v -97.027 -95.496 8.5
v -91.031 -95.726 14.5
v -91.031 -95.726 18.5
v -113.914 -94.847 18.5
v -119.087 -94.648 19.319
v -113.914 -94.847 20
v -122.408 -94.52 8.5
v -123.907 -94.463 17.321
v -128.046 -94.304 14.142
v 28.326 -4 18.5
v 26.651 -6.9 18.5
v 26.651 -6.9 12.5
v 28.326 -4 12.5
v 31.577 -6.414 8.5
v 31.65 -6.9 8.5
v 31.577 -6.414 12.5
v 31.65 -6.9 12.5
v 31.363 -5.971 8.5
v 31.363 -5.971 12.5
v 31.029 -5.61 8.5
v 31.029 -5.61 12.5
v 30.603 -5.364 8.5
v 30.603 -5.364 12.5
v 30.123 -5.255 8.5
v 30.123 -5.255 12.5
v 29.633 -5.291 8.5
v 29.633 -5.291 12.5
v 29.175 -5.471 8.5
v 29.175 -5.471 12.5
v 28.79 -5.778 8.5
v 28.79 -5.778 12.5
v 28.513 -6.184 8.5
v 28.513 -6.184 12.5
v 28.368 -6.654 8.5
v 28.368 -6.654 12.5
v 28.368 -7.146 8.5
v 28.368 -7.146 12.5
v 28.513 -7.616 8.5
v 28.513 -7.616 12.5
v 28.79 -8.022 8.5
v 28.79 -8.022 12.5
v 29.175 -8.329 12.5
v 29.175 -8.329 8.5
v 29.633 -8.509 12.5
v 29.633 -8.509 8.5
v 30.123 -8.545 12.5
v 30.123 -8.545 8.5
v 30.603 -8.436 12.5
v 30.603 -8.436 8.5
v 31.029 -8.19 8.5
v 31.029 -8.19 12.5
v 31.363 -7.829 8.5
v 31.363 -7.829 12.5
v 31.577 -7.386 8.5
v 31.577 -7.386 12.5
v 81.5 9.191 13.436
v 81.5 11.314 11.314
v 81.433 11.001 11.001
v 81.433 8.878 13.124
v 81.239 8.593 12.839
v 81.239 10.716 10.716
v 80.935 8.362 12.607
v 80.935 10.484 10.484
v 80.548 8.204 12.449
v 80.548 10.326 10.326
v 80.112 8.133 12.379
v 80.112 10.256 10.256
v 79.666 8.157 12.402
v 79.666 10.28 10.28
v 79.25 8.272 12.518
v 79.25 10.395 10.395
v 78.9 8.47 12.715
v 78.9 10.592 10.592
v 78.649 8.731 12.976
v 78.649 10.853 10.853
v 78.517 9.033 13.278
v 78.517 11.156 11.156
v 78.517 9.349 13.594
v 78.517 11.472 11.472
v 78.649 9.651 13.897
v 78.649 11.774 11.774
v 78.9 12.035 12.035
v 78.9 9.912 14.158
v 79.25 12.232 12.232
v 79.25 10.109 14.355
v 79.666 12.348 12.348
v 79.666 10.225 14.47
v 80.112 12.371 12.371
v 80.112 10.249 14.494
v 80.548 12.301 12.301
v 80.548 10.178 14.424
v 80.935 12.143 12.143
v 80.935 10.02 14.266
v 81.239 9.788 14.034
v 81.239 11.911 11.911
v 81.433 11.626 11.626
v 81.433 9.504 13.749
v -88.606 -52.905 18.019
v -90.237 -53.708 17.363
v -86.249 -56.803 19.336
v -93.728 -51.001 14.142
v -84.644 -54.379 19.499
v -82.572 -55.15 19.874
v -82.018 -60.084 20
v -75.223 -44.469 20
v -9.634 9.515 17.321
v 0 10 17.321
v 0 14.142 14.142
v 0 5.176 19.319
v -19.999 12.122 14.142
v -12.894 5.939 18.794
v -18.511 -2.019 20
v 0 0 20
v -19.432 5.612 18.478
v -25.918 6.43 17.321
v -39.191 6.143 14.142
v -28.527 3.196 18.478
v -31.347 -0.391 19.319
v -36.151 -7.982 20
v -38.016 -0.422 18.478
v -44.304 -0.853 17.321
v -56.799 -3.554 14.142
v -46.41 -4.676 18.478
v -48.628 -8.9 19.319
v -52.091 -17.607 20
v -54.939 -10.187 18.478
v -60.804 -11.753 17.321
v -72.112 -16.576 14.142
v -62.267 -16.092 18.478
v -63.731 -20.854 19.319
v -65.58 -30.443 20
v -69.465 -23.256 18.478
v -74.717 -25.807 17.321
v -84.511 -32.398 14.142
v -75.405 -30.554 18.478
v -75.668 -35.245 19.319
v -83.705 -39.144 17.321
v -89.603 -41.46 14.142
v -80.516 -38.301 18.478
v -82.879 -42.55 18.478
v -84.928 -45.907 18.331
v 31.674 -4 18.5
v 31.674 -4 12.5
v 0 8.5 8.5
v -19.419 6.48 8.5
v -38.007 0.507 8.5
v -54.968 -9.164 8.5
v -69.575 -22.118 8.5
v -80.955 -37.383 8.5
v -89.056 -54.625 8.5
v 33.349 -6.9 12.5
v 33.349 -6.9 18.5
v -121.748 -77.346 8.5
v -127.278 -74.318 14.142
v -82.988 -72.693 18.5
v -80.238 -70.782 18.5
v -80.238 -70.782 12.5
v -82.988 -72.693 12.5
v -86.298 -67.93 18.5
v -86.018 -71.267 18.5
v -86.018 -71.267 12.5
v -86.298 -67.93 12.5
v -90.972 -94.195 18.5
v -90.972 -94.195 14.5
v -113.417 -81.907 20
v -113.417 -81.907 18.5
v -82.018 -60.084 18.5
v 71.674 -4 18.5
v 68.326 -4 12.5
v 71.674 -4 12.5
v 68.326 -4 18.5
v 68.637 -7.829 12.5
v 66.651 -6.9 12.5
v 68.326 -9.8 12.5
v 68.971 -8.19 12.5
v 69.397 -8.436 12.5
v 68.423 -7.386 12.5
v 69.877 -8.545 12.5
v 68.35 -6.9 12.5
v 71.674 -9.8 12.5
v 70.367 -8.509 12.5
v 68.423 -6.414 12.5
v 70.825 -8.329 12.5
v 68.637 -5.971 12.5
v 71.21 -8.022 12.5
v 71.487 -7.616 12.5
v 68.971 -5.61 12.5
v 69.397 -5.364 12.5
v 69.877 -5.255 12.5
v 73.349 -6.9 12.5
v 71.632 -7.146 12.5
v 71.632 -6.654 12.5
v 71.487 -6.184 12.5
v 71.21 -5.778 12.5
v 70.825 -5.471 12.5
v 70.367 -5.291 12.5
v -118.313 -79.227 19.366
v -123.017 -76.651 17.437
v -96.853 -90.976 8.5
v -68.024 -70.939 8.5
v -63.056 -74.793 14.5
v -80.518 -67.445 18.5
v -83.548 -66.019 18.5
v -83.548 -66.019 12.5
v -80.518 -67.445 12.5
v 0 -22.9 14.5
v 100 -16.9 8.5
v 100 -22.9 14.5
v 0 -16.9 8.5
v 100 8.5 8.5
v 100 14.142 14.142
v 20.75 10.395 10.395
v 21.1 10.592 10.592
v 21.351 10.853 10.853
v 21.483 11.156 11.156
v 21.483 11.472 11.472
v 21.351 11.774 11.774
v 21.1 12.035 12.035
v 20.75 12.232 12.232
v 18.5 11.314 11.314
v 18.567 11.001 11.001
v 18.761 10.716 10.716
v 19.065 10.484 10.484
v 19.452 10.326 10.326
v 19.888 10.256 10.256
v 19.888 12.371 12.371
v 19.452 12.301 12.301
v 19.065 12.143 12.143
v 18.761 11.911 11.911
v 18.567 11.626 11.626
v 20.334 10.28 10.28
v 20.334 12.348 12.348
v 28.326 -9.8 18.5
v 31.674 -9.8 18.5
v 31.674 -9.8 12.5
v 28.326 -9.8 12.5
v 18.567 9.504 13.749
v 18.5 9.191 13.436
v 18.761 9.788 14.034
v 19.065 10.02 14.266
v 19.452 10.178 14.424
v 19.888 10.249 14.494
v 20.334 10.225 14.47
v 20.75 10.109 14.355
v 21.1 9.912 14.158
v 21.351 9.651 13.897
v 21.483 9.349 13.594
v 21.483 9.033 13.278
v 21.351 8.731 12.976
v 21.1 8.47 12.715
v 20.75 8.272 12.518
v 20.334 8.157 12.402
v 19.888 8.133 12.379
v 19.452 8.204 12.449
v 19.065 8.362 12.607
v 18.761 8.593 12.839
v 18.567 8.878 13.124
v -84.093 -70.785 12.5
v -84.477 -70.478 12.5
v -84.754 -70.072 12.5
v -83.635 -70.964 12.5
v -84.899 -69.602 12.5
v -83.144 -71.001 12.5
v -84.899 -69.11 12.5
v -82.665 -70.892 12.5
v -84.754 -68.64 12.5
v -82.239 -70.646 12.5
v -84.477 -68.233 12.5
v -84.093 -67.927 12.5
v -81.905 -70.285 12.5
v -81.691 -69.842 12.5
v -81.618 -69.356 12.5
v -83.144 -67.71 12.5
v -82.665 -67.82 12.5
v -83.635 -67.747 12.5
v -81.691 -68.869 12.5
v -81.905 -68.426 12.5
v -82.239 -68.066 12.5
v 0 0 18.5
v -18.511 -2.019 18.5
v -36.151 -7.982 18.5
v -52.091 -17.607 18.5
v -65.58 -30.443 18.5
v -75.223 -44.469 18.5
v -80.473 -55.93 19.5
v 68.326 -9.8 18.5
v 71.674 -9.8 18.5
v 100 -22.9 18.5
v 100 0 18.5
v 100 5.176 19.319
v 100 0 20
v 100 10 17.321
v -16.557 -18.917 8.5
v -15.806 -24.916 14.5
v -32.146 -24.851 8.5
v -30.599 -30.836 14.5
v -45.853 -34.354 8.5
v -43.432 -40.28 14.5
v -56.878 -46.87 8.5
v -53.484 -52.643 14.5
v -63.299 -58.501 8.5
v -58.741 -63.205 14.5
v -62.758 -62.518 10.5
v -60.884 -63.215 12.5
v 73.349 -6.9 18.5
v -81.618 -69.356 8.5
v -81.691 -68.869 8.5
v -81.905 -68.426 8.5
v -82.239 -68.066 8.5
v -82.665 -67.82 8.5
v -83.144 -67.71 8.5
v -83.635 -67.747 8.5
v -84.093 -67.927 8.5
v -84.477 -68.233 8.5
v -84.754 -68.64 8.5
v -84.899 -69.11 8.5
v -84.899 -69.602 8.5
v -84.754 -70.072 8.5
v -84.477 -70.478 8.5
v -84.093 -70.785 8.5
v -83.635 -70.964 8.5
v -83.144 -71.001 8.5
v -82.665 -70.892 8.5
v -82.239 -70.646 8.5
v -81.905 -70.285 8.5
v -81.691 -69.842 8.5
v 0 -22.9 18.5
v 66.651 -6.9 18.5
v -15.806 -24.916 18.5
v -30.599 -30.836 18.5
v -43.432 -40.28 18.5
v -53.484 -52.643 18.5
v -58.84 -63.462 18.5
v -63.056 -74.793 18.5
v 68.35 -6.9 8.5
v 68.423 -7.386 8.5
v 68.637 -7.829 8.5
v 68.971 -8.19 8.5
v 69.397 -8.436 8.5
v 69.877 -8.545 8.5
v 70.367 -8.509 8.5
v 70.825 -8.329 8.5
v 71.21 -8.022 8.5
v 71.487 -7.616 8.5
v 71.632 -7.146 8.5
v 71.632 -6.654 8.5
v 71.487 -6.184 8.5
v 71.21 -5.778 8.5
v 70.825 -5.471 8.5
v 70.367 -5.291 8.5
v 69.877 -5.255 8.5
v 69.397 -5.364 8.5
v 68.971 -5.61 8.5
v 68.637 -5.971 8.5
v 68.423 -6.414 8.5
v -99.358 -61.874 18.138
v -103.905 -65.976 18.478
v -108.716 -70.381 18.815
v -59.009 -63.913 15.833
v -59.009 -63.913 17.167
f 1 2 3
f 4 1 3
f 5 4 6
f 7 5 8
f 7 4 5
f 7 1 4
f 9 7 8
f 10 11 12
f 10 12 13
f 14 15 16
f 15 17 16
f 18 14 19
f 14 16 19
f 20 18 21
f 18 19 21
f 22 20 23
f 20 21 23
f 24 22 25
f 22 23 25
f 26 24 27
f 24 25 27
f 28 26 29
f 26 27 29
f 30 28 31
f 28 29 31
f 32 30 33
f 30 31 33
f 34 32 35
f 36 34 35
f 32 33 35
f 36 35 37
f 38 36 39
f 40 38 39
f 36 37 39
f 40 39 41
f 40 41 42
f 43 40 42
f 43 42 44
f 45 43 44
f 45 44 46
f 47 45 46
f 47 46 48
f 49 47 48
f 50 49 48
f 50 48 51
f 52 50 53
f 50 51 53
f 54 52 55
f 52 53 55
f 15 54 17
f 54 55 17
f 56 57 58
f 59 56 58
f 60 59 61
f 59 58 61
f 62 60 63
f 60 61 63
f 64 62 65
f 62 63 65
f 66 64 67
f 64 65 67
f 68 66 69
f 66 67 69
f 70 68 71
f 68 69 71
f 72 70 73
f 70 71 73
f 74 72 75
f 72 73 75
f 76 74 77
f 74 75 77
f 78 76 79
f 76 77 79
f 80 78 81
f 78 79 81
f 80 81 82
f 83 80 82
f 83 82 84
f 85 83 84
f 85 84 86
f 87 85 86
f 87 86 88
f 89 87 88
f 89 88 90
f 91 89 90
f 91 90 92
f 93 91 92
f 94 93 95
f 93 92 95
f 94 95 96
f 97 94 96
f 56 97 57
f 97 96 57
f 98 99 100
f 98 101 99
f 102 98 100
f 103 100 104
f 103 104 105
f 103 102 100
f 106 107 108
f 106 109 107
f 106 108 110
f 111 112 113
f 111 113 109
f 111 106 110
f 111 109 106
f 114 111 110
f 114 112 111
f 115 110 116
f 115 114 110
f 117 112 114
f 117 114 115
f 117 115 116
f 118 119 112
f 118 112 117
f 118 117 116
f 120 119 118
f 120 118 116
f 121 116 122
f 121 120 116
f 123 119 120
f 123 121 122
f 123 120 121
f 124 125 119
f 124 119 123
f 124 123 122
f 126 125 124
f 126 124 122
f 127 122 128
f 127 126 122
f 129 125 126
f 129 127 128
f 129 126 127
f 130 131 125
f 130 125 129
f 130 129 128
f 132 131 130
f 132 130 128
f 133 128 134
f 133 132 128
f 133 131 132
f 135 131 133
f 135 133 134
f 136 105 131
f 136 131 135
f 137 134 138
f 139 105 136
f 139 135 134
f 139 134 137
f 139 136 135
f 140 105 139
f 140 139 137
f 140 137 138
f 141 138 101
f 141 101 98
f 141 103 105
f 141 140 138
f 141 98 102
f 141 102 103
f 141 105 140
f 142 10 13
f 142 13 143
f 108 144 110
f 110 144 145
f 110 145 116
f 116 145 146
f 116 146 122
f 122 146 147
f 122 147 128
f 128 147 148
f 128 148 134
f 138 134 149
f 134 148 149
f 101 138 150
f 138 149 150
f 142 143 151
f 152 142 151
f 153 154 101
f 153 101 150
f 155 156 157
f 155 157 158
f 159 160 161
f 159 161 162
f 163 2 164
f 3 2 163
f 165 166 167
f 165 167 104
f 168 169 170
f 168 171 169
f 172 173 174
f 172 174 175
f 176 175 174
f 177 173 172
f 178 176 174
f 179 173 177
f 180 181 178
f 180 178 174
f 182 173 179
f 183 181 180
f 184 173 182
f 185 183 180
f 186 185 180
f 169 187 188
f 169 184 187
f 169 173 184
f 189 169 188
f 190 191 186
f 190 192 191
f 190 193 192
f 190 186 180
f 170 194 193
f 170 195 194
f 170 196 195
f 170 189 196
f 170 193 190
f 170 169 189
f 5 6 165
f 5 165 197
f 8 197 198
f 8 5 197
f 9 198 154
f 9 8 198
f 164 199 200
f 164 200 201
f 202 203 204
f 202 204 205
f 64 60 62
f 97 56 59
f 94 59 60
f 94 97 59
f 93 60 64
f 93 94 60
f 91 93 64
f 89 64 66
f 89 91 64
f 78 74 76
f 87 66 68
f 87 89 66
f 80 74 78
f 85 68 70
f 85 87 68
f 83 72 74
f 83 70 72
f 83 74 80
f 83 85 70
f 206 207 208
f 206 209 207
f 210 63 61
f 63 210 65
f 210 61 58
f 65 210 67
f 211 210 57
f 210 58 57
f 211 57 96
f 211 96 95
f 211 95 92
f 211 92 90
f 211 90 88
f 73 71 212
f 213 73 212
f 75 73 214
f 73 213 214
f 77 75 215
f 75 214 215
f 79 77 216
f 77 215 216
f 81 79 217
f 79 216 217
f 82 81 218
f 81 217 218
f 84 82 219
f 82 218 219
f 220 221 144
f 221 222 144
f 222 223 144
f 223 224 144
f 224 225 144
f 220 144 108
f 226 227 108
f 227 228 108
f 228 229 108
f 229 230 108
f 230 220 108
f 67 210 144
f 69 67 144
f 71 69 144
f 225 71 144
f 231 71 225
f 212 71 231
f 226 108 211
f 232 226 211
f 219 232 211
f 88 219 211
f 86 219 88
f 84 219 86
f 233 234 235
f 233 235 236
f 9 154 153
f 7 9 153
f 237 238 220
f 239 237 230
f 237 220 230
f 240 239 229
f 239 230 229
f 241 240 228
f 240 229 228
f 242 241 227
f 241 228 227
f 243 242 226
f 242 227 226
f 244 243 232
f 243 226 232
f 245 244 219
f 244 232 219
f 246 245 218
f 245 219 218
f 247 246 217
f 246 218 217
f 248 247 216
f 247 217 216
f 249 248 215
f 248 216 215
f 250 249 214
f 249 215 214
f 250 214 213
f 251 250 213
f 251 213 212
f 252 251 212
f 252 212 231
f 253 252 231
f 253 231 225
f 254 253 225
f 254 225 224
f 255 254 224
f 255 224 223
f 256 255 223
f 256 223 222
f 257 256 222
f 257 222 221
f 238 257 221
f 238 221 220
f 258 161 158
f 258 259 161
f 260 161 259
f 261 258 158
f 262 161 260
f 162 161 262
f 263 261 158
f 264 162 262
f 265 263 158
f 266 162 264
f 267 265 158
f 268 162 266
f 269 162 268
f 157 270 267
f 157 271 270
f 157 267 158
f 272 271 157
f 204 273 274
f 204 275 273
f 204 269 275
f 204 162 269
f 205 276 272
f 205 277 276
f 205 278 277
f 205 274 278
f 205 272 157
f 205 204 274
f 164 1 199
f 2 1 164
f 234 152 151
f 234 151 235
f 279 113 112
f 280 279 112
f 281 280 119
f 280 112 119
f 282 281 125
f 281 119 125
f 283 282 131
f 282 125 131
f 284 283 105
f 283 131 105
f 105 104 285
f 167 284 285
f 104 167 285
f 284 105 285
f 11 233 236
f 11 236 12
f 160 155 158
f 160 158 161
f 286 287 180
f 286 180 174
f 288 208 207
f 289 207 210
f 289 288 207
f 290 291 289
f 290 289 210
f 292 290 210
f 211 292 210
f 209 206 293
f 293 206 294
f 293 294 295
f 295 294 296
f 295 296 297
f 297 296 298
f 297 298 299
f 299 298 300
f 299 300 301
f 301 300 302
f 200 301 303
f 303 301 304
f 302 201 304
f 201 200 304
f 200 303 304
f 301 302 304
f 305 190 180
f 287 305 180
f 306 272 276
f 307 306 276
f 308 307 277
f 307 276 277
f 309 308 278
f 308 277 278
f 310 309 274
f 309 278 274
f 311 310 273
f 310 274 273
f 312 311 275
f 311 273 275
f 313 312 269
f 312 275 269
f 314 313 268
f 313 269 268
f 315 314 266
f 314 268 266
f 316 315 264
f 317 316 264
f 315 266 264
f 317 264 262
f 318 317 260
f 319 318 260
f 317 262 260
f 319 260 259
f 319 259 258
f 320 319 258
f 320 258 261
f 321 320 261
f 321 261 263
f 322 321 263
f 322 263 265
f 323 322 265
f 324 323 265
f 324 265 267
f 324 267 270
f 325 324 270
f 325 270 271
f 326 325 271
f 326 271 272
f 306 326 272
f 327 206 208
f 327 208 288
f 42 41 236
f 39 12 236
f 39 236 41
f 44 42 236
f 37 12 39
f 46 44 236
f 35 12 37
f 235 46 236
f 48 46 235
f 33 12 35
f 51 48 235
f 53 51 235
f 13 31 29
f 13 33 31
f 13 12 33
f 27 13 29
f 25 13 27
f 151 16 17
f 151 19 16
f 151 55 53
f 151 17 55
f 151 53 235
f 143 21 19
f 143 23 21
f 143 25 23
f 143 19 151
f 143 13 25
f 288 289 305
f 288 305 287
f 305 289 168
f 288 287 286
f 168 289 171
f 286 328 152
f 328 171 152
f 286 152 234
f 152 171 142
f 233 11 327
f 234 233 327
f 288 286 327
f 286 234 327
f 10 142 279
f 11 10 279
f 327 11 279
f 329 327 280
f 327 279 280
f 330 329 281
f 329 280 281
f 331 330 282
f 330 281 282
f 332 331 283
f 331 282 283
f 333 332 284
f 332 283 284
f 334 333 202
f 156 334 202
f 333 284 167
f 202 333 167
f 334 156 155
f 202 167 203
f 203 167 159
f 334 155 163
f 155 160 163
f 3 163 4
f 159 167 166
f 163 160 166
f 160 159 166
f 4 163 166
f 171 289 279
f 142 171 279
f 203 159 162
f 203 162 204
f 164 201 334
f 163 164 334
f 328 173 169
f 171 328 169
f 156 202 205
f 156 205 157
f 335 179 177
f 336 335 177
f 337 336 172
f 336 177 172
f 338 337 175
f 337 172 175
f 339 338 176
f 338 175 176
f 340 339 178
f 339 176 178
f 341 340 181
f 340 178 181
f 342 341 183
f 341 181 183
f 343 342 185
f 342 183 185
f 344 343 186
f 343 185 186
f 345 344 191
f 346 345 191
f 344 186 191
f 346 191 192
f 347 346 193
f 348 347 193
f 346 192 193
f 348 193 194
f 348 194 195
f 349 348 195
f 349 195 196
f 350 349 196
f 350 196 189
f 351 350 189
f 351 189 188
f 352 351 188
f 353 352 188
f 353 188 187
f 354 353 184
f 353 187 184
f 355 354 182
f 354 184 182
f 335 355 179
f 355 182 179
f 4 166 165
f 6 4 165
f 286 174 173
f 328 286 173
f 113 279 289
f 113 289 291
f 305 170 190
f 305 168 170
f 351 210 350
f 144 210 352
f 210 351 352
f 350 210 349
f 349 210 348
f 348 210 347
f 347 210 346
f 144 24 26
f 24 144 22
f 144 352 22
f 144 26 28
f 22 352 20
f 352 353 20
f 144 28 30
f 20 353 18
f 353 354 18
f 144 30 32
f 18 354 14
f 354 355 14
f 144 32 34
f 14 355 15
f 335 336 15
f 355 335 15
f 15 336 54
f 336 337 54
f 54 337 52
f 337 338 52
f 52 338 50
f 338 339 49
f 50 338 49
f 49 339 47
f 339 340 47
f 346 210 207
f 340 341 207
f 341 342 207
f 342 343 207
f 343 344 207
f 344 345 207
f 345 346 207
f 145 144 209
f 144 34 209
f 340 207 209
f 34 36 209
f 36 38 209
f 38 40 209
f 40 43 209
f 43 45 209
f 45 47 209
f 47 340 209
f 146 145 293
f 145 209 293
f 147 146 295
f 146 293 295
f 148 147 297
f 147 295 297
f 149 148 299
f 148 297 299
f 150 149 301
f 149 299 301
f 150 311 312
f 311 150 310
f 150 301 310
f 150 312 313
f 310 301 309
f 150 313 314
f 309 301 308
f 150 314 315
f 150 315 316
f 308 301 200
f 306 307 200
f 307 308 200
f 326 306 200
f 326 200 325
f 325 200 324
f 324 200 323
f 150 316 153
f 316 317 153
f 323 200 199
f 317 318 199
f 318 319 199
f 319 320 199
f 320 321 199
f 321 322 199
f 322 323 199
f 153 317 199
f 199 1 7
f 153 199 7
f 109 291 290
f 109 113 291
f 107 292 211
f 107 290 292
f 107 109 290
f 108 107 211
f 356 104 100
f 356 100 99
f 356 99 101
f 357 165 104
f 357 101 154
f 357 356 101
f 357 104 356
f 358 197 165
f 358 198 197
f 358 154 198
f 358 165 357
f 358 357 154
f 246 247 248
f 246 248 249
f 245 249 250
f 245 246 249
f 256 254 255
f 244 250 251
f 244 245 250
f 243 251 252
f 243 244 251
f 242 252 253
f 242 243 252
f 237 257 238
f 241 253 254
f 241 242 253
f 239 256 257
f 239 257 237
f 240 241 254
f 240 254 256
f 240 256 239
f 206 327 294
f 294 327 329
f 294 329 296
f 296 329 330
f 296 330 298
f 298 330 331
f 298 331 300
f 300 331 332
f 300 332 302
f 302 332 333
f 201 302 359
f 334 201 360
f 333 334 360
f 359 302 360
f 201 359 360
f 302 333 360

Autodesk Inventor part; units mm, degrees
ref_plane "YZ Plane" through (0, 0, 0) normal (1, 0, 0) x (0, 1, 0)
sketch "Sketch1" plane through (0, 0, 0) normal (1, 0, 0) x (0, 1, 0)
  circle A0 centre (0, 0) radius 20
  line L0 (8.5, 8.5) -> (-16.9, 8.5)
  line L1 (8.5, 8.5) -> (8.5, -16.9)
  line L2 (0, 0) -> (0, 20)
  line L3 (0, 20) -> (-60.9241, 20)
  line L4 (-60.9241, 20) -> (-60.9241, 18.5)
  line L5 (-60.9241, 18.5) -> (0, 18.5)
  line L6 (0, 18.5) -> (0, 20)
  line L7 (0, 0) -> (14.1421, 14.1421)
  line L8 (0, 0) -> (20, 0)
  line L9 (-16.9, 8.5) -> (-16.9, 18.5)
  line L10 (-16.9, 8.5) -> (-22.9, 14.5)
  line L11 (-22.9, 14.5) -> (-22.9, 18.5)
  line L12 (12.3744, 12.3744) -> (12.1502, 13.2109)
  line L13 (11.3137, 13.435) -> (9.2071, 11.3284)
  line L14 (9.4313, 10.4919) -> (10.2678, 10.2678)
  line L15 (8.5, 8.5) -> (8.5, -16.9)
  line L16 (20, 0) -> (20, -60.9241)
  line L17 (20, -60.9241) -> (18.5, -60.9241)
  line L18 (18.5, -60.9241) -> (18.5, 0)
  line L19 (8.5, -16.9) -> (18.5, -16.9)
  line L20 (8.5, -16.9) -> (14.5, -22.9)
  line L21 (14.5, -22.9) -> (18.5, -22.9)
  arc A1 (9.2071, 11.3284) -> (9.4313, 10.4919) centre (9.5607, 10.9749) ccw
  arc A2 (12.1502, 13.2109) -> (11.3137, 13.435) centre (11.6673, 13.0815) ccw
  line L22 (10.4311, 10.4311) -> (9.483, 10.6851)
  arc A3 (9.3485, 11.187) -> (9.483, 10.6851) centre (9.5607, 10.9749) ccw
  line L23 (9.3485, 11.187) -> (11.4551, 13.2936)
  arc A4 (11.957, 13.1591) -> (11.4551, 13.2936) centre (11.6673, 13.0815) ccw
  line L24 (11.957, 13.1591) -> (12.2111, 12.2111)
  point P0 (0, 8.5)
  point P1 (-17.7041, 9.3041)
  point P2 (-16.9, 10.6953)
  dimension "d0" = 40
  dimension "d1" = 25.4
  dimension "d2" = 1.5
  dimension "d4" = 45
  dimension "d6" = 45
  dimension "d7" = 4
  dimension "d8" = 10
  dimension "d10" = 2.5
  dimension "d11" = 2.5
  dimension "d12" = 60
  dimension "d13" = 1.5
  dimension "d15" = 0.5
  dimension "d16" = 0.2
extrude "Extrusion1" add sketch "Sketch1" along normal blind 100 contours L7 L12 A2 L13 A1 L14 L0 L2 A0 | L7 L24 A4 L23 A3 L22 L14 A1 L13 A2 L12 | L5 L2 L0 L9 A0 | A0 L9 L5 | L7 L22 A3 L23 A4 L24 | L9 L10 A0 | A0 L10 L11 L5 L9
sketch "Sketch2" plane through (0, -22.9, 18.5) normal (0, 0, 1) x (1, 0, 0)
  line L0 (0, 22.9) -> (0, 0) projected
  line L1 (0, 0) -> (100, 0) projected
  line L2 (100, 22.9) -> (100, 0) projected
  line L3 (0, 22.9) -> (100, 22.9) projected
  line L4 (28.3257, 13.1) -> (26.6514, 16)
  line L5 (26.6514, 16) -> (28.3257, 18.9)
  line L6 (28.3257, 18.9) -> (31.6743, 18.9)
  line L7 (31.6743, 18.9) -> (33.3486, 16)
  line L8 (33.3486, 16) -> (31.6743, 13.1)
  line L9 (31.6743, 13.1) -> (28.3257, 13.1)
  line L10 (0, 6) -> (100, 6) projected
  circle A0 centre (30, 16) radius 1.65
  dimension "d20" = 10
  dimension "d21" = 5.8
  dimension "d22" = 30
  dimension "d25" = 3.3
extrude "Extrusion2" cut sketch "Sketch2" against normal blind 6 contours L4 L5 L6 L7 L8 L9 | A0
extrude "Extrusion3" cut sketch "Sketch2" against normal through all contours A0
sketch "Sketch3" plane through (0, -22.9, 18.5) normal (0, 0, 1) x (1, 0, 0)
  line L0 (0, 37.0421) -> (100, 37.0421) projected
  line L1 (0, 0) -> (100, 0) projected
  line L2 (0, 22.9) -> (0, 0) projected
  line L3 (0, 22.9) -> (0, 37.0421) projected
  line L4 (2.4384, 37.0421) -> (17.8575, 0)
  line L5 (0, 0) -> (100, 0) projected
  line L6 (2.4384, 37.0421) -> (0, 42.9) projected
  point P0 (0, 26.9698)
  dimension "d28" = 112.6
sketch "Sketch4" plane through (100, 14.1421, 14.1421) normal (0, 0.7071, -0.7071) x (-1, 0, 0)
  line L0 (100, 0) -> (0, 0) projected
  line L1 (0, -7.9792) -> (0, 0) projected
  line L2 (100, -7.9792) -> (0, -7.9792) projected
  circle A0 centre (80, -4) radius 1.5
  line L3 (100, -7.9792) -> (100, 0) projected
  line L4 (50, -7.9792) -> (50, 0)
  ellipse E0 centre (70, -18.8686) end of major axis (68.35, -18.8686) minor radius 1.1667 projected
  point P0 (100, -20)
  dimension "d34" = 3
  dimension "d35" = 4
  dimension "d46" = 20
extrude "Extrusion5" cut sketch "Sketch4" against normal blind 3 contours A0
ref_plane "Work Plane1" through (50, 0, 0) normal (-1, 0, 0) x (0, 0, 1)
mirror "Mirror1" about plane through (50, 0, 0) normal (-1, 0, 0) of "Extrusion5", "Extrusion2", "Extrusion3"
ref_plane "Work Plane2" through (0, 14.1421, 14.1421) normal (0, 0, 1) x (1, 0, 0)
sketch "Sketch9" plane through (0, 14.1421, 14.1421) normal (0, 0, 1) x (1, 0, 0)
  line L0 (0, 0) -> (100, 0) projected
  line L1 (0, 0) -> (-127.2781, -88.4606) construction
  line L2 (0, -14.1421) -> (0, 0) projected
  arc A0 (0, 0) -> (-93.7282, -65.1428) centre (0, -100) ccw
  line L3 (-127.2781, -88.4606) -> (-93.7282, -65.1428)
  line L4 (-127.2781, -88.4606) -> (-128.0459, -108.4459)
  dimension "d61" = 155
  dimension "d62" = 145.2
  dimension "d63" = 100
  dimension "d66" = 127
  dimension "d67" = 20
sketch "Sketch10" plane through (0, 0, 0) normal (-1, 0, 0) x (0, 0, 1)
  line L0 (14.5, -22.9) -> (8.5, -16.9) projected
  line L1 (18.5, -22.9) -> (14.5, -22.9) projected
  line L2 (18.5, 0) -> (18.5, -22.9) projected
  line L3 (20, 0) -> (18.5, 0) projected
  arc A0 (20, 0) -> (14.1421, 14.1421) centre (0, 0) ccw projected
  line L4 (8.5, 8.5) -> (14.1421, 14.1421) projected
  line L5 (8.5, -16.9) -> (8.5, 8.5) projected
sweep "Sweep2" add profiles "Sketch10" path "Sketch9" path curves A0 L3 L4
sketch "Sketch11" plane through (100, -22.9, 18.5) normal (0, 0, 1) x (1, 0, 0)
  line L0 (-33.3486, 16) -> (-31.6743, 18.9) projected
  line L1 (-31.6743, 18.9) -> (-28.3257, 18.9) projected
  line L2 (-28.3257, 18.9) -> (-26.6514, 16) projected
  line L3 (-26.6514, 16) -> (-28.3257, 13.1) projected
  line L4 (-28.3257, 13.1) -> (-31.6743, 13.1) projected
  line L5 (-31.6743, 13.1) -> (-33.3486, 16) projected
  line L6 (-68.3257, 18.9) -> (-66.6514, 16) projected
  line L7 (-66.6514, 16) -> (-68.3257, 13.1) projected
  line L8 (-68.3257, 13.1) -> (-71.6743, 13.1) projected
  line L9 (-71.6743, 13.1) -> (-73.3486, 16) projected
  line L10 (-73.3486, 16) -> (-71.6743, 18.9) projected
  line L11 (-71.6743, 18.9) -> (-68.3257, 18.9) projected
  line L12 (-100, 0) -> (0, 0) projected
  line L13 (-100, 22.9) -> (0, 22.9) projected
  arc A0 (-100, 22.9) -> (-180.473, -33.0302) centre (-100, -62.9579) ccw projected
  line L14 (-180.473, -33.0302) -> (-182.0179, -37.1841) projected
  line L15 (-182.0179, -37.1841) -> (-213.4171, -59.0072) projected
  line L16 (-213.4171, -59.0072) -> (-213.9142, -71.9466) projected
  line L17 (-190.9723, -71.2953) -> (-191.0311, -72.8257) projected
  line L18 (-163.0556, -51.8928) -> (-190.9723, -71.2953) projected
  line L19 (-159.0093, -41.0125) -> (-163.0556, -51.8928) projected
  arc A1 (-100, 0) -> (-159.0093, -41.0125) centre (-100, -62.9579) ccw projected
  circle A2 centre (-30, 16) radius 1.65 projected
  circle A3 centre (-70, 16) radius 1.65 projected
  line L20 (-100, 31.4) -> (0, 31.4) projected
  line L21 (-100, 6) -> (0, 6) projected
  arc A4 (-100, 6) -> (-164.633, -38.9211) centre (-100, -62.9579) ccw projected
  line L22 (-164.633, -38.9211) -> (-168.0239, -48.039) projected
  line L23 (-168.0239, -48.039) -> (-196.853, -68.0757) projected
  line L24 (-196.853, -68.0757) -> (-197.0266, -72.5954) projected
  line L25 (-221.7481, -54.446) -> (-222.4079, -71.6203) projected
  line L26 (-189.0563, -31.7246) -> (-221.7481, -54.446) projected
  line L27 (-188.4399, -30.0674) -> (-189.0563, -31.7246) projected
  arc A5 (-100, 31.4) -> (-188.4399, -30.0674) centre (-100, -62.9579) ccw projected
  line L28 (-207.0193, -72.2115) -> (-206.6542, -62.7097)
  line L29 (-206.6542, -62.7097) -> (-176.3043, -41.616)
  line L30 (-176.3043, -41.616) -> (-174.0058, -35.4354)
  arc A6 (-100, 16) -> (-174.0058, -35.4354) centre (-100, -62.9579) ccw
  line L31 (-100, 16) -> (0, 16)
  line L32 (-186.0175, -48.3668) -> (-186.2977, -45.0299)
  line L33 (-186.2977, -45.0299) -> (-183.548, -43.1188)
  line L34 (-183.548, -43.1188) -> (-180.5181, -44.5446)
  line L35 (-180.5181, -44.5446) -> (-180.2379, -47.8815)
  line L36 (-180.2379, -47.8815) -> (-182.9876, -49.7926)
  line L37 (-182.9876, -49.7926) -> (-186.0175, -48.3668)
  circle A7 centre (-183.2678, -46.4557) radius 1.65
  point P0 (-181.6127, -48.8371)
  point P1 (-191.4793, -52.1629)
  dimension "d68" = 10
  dimension "d70" = 5.8
  dimension "d75" = 3.3
  dimension "d76" = 10
extrude "Extrusion7" cut sketch "Sketch11" against normal through all contours A7 L29 | L29 A7
extrude "Extrusion8" cut sketch "Sketch11" against normal blind 6 contours L35 L36 L37 L29 A7 | L29 A7 L32 L33 L34 | A7 L29 | L29 A7
sketch "Sketch12" plane through (100, -22.9, 18.5) normal (0, 0, 1) x (1, 0, 0)
  line L0 (-186.0175, -48.3668) -> (-186.2977, -45.0299) projected
  line L1 (-186.2977, -45.0299) -> (-183.548, -43.1188) projected
  line L2 (-183.548, -43.1188) -> (-180.5181, -44.5446) projected
  line L3 (-180.5181, -44.5446) -> (-180.2379, -47.8815) projected
  line L4 (-180.2379, -47.8815) -> (-182.9876, -49.7926) projected
  line L5 (-182.9876, -49.7926) -> (-186.0175, -48.3668) projected
  line L6 (-33.3486, 16) -> (-31.6743, 18.9) projected
  line L7 (-31.6743, 18.9) -> (-28.3257, 18.9) projected
  line L8 (-28.3257, 18.9) -> (-26.6514, 16) projected
  line L9 (-26.6514, 16) -> (-28.3257, 13.1) projected
  line L10 (-28.3257, 13.1) -> (-31.6743, 13.1) projected
  line L11 (-31.6743, 13.1) -> (-33.3486, 16) projected
  line L12 (-68.3257, 18.9) -> (-66.6514, 16) projected
  line L13 (-66.6514, 16) -> (-68.3257, 13.1) projected
  line L14 (-68.3257, 13.1) -> (-71.6743, 13.1) projected
  line L15 (-71.6743, 13.1) -> (-73.3486, 16) projected
  line L16 (-73.3486, 16) -> (-71.6743, 18.9) projected
  line L17 (-71.6743, 18.9) -> (-68.3257, 18.9) projected
  line L18 (-100, 0) -> (0, 0) projected
  line L19 (0, 22.9) -> (0, 0) projected
  line L20 (-100, 22.9) -> (0, 22.9) projected
  arc A0 (-100, 22.9) -> (-180.473, -33.0302) centre (-100, -62.9579) ccw projected
  line L21 (-180.473, -33.0302) -> (-182.0179, -37.1841) projected
  line L22 (-182.0179, -37.1841) -> (-213.4171, -59.0072) projected
  line L23 (-213.4171, -59.0072) -> (-213.9142, -71.9466) projected
  line L24 (-191.0311, -72.8257) -> (-213.9142, -71.9466) projected
  line L25 (-190.9723, -71.2953) -> (-191.0311, -72.8257) projected
  line L26 (-163.0556, -51.8928) -> (-190.9723, -71.2953) projected
  line L27 (-159.0093, -41.0125) -> (-163.0556, -51.8928) projected
  arc A1 (-100, 0) -> (-159.0093, -41.0125) centre (-100, -62.9579) ccw projected
properties part number "ESQUINA_REDONDEADA_R20" material "Steel, Mild, Welded"
